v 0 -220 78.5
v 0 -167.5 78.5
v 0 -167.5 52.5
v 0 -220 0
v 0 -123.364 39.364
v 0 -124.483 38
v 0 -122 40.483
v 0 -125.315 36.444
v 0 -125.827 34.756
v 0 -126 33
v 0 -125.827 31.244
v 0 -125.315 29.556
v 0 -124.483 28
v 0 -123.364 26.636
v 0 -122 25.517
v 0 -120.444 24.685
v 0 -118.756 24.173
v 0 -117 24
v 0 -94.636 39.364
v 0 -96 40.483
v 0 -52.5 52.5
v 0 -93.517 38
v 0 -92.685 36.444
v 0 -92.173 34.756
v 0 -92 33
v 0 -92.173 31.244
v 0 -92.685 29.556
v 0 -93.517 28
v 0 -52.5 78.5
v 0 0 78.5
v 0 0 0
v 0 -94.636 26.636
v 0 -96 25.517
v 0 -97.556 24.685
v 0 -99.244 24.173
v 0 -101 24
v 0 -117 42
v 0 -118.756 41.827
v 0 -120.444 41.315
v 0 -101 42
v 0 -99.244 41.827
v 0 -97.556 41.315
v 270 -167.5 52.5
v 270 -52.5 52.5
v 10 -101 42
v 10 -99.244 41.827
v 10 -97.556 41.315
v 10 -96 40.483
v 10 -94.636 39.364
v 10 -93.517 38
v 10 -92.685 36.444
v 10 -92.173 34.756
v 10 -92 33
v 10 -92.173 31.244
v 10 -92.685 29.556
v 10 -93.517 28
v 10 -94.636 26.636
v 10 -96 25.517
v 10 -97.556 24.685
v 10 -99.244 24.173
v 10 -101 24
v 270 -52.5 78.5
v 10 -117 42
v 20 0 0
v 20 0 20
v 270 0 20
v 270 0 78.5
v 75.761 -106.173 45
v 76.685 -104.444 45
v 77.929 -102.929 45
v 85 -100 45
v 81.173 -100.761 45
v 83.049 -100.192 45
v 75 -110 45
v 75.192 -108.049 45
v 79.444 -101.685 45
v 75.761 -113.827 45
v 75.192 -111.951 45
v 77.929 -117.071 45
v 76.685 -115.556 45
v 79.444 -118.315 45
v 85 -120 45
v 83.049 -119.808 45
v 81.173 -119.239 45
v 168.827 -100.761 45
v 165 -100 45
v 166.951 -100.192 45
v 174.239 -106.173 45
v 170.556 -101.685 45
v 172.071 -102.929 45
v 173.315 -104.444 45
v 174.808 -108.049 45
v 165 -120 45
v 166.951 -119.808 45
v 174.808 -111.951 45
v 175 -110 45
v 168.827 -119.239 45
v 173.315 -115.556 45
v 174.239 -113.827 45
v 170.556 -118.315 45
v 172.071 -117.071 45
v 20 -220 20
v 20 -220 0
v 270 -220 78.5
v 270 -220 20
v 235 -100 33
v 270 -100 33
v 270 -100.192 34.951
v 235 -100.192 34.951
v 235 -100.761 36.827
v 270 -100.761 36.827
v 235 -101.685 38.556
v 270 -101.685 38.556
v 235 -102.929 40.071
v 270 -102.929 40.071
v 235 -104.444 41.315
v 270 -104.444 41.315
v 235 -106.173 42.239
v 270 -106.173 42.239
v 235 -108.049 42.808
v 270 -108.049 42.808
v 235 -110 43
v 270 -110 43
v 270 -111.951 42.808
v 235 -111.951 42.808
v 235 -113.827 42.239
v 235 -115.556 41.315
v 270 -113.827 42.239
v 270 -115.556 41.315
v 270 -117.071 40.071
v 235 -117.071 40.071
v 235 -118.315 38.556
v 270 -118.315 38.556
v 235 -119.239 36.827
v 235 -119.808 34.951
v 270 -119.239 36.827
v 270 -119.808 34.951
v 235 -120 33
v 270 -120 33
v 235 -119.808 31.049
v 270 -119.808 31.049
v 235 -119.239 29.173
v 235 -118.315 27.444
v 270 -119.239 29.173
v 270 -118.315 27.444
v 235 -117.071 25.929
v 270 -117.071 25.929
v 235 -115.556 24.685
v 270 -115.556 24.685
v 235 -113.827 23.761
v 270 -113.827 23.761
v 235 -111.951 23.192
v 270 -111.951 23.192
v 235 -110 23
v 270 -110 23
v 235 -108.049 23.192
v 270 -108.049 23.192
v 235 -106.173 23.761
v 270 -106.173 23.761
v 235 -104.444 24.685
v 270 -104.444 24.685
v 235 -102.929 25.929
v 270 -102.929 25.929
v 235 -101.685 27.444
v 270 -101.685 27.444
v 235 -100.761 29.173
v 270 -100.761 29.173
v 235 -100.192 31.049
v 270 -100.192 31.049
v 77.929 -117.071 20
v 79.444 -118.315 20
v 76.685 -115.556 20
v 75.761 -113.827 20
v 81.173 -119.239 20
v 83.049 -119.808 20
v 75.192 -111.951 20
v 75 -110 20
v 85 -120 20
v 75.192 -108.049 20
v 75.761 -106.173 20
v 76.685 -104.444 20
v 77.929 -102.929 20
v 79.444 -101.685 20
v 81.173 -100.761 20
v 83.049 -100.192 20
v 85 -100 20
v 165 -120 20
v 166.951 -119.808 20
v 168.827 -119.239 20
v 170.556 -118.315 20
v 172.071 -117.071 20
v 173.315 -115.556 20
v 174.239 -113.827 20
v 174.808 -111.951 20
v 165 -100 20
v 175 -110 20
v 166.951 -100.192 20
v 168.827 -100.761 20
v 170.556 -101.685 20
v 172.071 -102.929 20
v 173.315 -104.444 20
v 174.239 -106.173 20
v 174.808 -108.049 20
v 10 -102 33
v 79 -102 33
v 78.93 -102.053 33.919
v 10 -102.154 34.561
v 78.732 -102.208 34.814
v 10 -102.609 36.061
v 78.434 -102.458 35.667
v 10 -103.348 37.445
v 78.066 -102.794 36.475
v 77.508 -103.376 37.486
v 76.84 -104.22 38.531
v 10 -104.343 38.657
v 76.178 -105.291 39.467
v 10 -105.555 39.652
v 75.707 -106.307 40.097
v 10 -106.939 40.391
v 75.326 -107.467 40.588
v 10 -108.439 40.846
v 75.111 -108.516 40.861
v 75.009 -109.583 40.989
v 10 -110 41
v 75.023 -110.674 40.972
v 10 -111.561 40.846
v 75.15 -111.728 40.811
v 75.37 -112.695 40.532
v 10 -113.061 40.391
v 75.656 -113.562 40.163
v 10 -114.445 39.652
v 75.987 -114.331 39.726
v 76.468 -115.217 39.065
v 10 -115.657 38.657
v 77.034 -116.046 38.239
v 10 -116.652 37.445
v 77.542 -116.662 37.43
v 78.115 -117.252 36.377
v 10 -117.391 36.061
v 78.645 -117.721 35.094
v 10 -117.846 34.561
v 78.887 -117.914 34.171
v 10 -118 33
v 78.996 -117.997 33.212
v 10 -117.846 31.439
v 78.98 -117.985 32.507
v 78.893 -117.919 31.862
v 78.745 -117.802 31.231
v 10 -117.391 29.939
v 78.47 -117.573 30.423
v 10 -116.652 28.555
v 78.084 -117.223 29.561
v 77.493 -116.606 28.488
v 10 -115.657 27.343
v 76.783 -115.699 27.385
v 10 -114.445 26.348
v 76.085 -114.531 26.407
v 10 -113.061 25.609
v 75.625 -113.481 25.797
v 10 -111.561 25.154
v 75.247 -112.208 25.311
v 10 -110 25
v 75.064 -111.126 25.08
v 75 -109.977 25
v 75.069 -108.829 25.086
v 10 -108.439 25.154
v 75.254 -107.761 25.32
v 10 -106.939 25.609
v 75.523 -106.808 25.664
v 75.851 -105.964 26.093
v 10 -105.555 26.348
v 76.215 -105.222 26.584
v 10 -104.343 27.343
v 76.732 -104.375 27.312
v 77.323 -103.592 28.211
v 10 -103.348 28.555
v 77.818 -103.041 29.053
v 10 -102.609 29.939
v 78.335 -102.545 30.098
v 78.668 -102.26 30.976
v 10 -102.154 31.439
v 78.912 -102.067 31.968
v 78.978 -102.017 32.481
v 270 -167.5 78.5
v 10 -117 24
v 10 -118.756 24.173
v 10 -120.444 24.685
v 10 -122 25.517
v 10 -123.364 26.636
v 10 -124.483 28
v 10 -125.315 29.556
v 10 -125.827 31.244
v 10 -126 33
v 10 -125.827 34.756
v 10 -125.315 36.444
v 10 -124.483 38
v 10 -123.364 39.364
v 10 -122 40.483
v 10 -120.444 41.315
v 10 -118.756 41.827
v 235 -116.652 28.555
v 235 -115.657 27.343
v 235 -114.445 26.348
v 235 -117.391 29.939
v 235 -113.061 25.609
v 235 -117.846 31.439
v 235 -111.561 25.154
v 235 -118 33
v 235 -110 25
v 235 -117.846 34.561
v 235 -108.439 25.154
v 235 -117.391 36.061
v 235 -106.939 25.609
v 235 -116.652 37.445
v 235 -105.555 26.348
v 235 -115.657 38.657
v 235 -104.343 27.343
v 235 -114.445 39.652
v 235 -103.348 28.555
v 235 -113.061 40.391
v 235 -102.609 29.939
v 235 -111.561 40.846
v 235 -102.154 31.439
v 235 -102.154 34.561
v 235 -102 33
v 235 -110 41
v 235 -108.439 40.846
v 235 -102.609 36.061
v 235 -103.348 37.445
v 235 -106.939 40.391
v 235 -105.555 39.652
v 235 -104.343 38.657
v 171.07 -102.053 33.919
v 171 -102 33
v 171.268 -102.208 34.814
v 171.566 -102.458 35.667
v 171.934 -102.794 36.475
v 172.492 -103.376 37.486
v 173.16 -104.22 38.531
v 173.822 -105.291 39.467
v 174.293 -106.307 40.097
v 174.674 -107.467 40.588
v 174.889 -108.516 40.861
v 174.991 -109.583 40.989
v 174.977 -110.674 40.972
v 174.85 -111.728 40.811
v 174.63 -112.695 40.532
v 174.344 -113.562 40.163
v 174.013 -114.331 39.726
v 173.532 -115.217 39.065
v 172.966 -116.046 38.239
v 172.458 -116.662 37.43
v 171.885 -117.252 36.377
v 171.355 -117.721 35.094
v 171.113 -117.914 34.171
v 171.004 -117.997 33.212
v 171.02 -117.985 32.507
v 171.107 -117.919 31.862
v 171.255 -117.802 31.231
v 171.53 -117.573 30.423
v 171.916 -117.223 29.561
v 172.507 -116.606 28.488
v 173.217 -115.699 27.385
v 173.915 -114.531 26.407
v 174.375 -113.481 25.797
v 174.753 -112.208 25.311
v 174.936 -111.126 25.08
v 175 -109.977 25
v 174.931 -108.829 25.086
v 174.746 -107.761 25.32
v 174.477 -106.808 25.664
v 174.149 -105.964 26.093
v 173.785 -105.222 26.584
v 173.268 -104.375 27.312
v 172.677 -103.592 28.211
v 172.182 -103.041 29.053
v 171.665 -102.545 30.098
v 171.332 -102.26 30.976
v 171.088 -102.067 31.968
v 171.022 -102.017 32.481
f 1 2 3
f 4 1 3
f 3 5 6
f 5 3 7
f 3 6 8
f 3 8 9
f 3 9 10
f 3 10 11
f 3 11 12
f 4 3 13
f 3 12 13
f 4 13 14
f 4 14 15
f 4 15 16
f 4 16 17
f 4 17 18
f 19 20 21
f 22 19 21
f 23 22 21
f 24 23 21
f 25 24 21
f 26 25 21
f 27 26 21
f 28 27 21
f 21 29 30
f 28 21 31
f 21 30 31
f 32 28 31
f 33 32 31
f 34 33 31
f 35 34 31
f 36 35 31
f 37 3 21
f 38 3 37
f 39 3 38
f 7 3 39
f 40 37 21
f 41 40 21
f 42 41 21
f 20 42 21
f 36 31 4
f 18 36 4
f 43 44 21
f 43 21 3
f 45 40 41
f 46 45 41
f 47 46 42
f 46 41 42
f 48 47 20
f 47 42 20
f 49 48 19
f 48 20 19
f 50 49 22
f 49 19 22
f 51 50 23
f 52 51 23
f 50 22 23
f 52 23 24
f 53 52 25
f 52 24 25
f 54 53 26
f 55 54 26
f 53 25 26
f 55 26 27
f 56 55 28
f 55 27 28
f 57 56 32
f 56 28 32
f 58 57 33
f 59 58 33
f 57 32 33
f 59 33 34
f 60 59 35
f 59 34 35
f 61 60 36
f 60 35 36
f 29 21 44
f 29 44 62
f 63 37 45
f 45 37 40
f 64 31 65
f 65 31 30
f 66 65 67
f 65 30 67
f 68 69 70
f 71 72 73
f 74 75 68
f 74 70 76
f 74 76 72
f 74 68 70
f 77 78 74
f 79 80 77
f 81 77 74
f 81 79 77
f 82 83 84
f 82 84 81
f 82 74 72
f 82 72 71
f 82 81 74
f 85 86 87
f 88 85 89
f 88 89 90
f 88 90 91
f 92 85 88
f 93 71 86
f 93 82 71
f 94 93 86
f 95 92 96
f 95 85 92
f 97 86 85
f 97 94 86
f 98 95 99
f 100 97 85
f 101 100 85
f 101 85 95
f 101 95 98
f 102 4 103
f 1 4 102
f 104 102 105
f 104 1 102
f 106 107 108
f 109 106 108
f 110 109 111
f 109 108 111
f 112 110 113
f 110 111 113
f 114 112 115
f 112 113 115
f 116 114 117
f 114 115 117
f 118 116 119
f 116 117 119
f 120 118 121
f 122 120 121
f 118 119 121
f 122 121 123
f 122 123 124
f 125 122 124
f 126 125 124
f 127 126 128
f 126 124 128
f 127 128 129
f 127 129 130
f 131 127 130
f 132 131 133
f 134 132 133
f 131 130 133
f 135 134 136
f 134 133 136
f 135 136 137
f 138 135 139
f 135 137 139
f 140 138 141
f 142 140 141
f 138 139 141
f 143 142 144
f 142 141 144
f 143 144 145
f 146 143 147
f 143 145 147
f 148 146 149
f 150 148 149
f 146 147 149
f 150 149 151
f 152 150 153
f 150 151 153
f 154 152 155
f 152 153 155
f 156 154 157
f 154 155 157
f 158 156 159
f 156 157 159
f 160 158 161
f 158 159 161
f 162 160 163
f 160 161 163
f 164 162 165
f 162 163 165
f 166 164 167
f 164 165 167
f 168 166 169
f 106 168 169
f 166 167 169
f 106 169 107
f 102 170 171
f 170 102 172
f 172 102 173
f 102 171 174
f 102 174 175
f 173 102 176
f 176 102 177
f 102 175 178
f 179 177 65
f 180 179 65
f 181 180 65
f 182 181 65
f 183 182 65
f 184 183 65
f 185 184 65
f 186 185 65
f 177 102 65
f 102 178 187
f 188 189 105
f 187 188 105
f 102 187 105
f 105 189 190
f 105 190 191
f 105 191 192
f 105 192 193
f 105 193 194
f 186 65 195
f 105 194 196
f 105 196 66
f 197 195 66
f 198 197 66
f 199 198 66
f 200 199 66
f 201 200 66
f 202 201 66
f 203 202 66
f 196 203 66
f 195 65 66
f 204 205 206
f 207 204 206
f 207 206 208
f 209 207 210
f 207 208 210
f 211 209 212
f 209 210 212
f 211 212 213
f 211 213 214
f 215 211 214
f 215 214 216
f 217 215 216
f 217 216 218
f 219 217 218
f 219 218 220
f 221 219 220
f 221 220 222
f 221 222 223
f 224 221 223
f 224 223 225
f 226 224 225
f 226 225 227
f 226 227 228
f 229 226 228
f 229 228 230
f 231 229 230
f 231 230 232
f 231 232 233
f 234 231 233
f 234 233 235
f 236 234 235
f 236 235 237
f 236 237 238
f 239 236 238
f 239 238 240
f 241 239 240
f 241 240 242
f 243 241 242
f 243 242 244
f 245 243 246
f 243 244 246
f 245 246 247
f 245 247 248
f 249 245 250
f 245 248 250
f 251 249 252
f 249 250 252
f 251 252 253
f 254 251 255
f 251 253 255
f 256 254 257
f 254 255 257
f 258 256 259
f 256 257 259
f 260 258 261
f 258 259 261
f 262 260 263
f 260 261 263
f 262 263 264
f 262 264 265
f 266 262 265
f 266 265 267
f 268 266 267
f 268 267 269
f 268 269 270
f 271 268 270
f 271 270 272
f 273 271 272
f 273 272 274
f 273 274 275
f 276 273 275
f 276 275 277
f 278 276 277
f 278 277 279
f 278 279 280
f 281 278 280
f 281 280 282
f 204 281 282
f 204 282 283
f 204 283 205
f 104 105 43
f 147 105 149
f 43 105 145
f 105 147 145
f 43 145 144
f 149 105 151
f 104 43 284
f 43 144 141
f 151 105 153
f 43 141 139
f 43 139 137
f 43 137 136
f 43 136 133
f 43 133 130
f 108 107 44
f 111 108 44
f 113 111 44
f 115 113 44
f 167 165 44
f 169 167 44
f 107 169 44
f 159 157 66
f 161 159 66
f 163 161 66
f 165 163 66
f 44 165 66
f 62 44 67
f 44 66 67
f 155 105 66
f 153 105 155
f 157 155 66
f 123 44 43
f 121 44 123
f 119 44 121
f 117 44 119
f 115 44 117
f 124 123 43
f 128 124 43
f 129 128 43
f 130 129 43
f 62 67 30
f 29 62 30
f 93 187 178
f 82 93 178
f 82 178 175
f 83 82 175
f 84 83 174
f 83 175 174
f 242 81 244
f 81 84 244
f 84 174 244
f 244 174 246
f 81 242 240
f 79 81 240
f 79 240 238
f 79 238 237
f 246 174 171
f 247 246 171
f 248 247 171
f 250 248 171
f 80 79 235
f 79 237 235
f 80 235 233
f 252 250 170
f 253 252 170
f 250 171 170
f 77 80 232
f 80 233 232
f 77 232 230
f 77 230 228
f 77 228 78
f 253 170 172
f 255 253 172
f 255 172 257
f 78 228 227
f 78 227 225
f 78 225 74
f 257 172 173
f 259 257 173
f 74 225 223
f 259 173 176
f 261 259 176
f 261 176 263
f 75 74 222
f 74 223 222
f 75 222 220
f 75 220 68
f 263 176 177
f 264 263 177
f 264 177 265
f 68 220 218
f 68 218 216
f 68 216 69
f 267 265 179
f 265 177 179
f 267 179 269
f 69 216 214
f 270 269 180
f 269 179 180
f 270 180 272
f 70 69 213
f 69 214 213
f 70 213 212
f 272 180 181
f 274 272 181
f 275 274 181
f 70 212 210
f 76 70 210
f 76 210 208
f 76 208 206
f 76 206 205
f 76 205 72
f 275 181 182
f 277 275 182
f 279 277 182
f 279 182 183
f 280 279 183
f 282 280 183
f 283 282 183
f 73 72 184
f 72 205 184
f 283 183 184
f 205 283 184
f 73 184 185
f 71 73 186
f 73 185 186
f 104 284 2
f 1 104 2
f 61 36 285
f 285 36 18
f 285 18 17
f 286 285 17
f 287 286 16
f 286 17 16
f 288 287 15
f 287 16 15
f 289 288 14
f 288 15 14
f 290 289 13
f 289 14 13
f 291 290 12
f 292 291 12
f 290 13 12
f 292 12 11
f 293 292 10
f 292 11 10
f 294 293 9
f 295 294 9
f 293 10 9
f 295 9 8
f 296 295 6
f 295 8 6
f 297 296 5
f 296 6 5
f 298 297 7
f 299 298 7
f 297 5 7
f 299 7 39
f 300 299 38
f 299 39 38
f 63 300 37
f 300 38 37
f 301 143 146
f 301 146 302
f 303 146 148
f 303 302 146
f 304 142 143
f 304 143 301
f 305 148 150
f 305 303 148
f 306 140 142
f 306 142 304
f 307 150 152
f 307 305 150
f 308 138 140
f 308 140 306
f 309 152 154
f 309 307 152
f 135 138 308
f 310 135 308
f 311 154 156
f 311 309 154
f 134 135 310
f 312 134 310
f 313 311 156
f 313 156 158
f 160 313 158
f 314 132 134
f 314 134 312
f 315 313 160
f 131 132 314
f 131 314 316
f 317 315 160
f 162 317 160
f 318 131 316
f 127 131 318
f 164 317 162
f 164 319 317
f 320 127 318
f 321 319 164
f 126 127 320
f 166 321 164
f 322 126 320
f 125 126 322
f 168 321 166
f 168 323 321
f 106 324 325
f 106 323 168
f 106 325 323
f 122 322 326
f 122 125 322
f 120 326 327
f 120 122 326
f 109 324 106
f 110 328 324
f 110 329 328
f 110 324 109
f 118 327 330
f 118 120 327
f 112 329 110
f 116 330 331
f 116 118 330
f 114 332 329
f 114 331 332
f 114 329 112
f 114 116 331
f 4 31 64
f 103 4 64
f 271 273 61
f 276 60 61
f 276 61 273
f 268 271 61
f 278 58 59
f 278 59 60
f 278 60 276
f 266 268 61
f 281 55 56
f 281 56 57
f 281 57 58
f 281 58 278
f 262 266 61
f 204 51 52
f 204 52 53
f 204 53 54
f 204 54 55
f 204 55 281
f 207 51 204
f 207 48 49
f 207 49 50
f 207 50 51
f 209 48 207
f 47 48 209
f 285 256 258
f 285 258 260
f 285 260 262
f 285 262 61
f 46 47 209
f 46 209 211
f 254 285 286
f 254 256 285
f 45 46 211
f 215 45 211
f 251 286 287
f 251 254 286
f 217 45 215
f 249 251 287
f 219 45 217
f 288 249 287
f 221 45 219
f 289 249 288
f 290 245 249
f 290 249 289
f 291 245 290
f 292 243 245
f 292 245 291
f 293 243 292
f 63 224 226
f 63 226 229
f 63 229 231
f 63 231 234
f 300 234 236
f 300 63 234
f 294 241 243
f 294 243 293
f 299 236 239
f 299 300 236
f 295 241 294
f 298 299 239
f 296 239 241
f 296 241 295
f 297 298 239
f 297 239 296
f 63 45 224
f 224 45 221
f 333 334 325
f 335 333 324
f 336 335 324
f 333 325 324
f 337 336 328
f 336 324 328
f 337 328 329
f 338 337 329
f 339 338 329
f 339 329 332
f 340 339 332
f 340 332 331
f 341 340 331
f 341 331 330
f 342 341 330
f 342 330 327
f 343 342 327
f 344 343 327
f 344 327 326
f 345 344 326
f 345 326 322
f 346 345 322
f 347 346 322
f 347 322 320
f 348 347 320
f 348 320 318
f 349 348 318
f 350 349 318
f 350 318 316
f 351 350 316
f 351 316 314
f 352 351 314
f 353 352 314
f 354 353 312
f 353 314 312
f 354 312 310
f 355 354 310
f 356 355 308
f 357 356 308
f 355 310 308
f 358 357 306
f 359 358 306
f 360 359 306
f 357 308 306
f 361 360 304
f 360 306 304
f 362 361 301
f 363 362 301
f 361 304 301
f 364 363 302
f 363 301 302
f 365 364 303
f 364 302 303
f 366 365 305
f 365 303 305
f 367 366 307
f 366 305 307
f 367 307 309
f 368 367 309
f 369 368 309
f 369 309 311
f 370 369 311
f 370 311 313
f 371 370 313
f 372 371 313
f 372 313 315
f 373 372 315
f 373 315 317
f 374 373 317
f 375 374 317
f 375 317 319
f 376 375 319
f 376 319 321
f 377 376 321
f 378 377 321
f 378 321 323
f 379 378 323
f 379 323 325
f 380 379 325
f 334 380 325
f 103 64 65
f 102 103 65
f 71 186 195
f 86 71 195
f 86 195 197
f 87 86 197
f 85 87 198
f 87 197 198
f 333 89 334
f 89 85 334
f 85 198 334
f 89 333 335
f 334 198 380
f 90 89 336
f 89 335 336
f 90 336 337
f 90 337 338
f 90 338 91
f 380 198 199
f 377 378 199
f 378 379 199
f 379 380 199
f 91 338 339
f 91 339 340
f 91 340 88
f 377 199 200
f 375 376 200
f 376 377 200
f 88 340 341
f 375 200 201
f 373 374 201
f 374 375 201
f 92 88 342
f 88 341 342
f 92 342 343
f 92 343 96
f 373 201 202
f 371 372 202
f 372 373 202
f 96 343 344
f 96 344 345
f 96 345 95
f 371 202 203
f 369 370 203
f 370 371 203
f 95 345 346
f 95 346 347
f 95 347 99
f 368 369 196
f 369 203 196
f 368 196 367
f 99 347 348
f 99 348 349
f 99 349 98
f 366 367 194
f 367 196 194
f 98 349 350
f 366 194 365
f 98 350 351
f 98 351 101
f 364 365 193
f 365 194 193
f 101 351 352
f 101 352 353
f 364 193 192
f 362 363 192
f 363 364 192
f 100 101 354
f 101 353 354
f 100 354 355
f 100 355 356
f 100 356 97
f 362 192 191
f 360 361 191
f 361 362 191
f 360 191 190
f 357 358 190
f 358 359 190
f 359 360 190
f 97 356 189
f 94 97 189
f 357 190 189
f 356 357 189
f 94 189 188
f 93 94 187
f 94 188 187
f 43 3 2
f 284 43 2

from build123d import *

# Parameters (mm, degrees)
F1_DEPTH  = 220
F2_R      = 8
F3_DEPTH  = 270.001
F2_R_2    = 10
F4_DEPTH  = 35
F6_DEPTH  = 25
F8_DEPTH  = 10
F9_W      = 115
F9_H      = 26
F10_DEPTH = 270.001


with BuildPart() as f1:
    # F0 (on Front) → F1 (new body)
    with BuildSketch(Plane.XZ):
        Polygon((0, 78.5), (0, 0), (20, 0), (20, 20), (270, 20), (270, 78.5), align=None)
    extrude(amount=F1_DEPTH)

    # F2 (on face) → F3 (cut, through all)
    with BuildSketch(Plane.YZ.offset(270)):
        with Locations((-110, 33)):
            Circle(F2_R)
    extrude(amount=-F3_DEPTH, mode=Mode.SUBTRACT)

    # F2 (on face) → F4 (cut)
    with BuildSketch(Plane.YZ.offset(270)):
        with Locations((-110, 33)):
            Circle(F2_R_2)
        with Locations((-110, 33)):
            Circle(F2_R, mode=Mode.SUBTRACT)
    extrude(amount=-F4_DEPTH, mode=Mode.SUBTRACT)

    # F5 (on face) → F6 (cut)
    with BuildSketch(Plane(origin=(0, 0, 20), x_dir=(1, 0, 0), z_dir=(0, 0, -1))):
        with BuildLine():
            Line((165, 120), (85, 120))
            ThreePointArc((85, 120), (75, 110), (85, 100))
            Line((85, 100), (165, 100))
            ThreePointArc((165, 100), (175, 110), (165, 120))
        make_face()
    extrude(amount=-F6_DEPTH, mode=Mode.SUBTRACT)

    # F7 (on face) → F8 (cut)
    with BuildSketch(Plane(origin=(0, 0, 0), x_dir=(0, -1, 0), z_dir=(-1, 0, 0))):
        with BuildLine():
            Line((117, 42), (101, 42))
            ThreePointArc((101, 42), (92, 33), (101, 24))
            Line((101, 24), (117, 24))
            ThreePointArc((117, 24), (126, 33), (117, 42))
        make_face()
    extrude(amount=-F8_DEPTH, mode=Mode.SUBTRACT)

    # F9 (on face) → F10 (cut, through all)
    with BuildSketch(Plane(origin=(0, 0, 0), x_dir=(0, -1, 0), z_dir=(-1, 0, 0))):
        with Locations((110, 65.5)):
            Rectangle(F9_W, F9_H)
    extrude(amount=-F10_DEPTH, mode=Mode.SUBTRACT)


solid = f1.part
